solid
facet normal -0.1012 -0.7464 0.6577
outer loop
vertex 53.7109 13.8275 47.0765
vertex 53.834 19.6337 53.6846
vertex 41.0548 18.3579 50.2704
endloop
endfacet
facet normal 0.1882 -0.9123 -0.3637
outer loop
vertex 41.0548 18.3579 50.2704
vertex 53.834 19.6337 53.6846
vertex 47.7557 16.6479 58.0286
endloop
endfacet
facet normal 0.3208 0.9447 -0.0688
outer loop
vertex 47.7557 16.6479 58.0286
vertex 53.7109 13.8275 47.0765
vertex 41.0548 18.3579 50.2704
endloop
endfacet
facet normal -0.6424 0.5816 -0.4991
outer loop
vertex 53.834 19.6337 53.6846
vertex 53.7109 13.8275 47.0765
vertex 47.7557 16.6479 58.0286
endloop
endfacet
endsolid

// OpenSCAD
// Auto-generated auxetic polyhedron
points = [
    [41.054783, 18.357917, 50.270403],
    [53.833966, 19.633742, 53.684586],
    [53.710875, 13.827479, 47.076536],
    [47.755745, 16.647940, 58.028572],
];

faces = [
    [0, 1, 2],
    [3, 1, 0],
    [0, 2, 3],
    [3, 2, 1],
];

polyhedron(points = points, faces = faces);
